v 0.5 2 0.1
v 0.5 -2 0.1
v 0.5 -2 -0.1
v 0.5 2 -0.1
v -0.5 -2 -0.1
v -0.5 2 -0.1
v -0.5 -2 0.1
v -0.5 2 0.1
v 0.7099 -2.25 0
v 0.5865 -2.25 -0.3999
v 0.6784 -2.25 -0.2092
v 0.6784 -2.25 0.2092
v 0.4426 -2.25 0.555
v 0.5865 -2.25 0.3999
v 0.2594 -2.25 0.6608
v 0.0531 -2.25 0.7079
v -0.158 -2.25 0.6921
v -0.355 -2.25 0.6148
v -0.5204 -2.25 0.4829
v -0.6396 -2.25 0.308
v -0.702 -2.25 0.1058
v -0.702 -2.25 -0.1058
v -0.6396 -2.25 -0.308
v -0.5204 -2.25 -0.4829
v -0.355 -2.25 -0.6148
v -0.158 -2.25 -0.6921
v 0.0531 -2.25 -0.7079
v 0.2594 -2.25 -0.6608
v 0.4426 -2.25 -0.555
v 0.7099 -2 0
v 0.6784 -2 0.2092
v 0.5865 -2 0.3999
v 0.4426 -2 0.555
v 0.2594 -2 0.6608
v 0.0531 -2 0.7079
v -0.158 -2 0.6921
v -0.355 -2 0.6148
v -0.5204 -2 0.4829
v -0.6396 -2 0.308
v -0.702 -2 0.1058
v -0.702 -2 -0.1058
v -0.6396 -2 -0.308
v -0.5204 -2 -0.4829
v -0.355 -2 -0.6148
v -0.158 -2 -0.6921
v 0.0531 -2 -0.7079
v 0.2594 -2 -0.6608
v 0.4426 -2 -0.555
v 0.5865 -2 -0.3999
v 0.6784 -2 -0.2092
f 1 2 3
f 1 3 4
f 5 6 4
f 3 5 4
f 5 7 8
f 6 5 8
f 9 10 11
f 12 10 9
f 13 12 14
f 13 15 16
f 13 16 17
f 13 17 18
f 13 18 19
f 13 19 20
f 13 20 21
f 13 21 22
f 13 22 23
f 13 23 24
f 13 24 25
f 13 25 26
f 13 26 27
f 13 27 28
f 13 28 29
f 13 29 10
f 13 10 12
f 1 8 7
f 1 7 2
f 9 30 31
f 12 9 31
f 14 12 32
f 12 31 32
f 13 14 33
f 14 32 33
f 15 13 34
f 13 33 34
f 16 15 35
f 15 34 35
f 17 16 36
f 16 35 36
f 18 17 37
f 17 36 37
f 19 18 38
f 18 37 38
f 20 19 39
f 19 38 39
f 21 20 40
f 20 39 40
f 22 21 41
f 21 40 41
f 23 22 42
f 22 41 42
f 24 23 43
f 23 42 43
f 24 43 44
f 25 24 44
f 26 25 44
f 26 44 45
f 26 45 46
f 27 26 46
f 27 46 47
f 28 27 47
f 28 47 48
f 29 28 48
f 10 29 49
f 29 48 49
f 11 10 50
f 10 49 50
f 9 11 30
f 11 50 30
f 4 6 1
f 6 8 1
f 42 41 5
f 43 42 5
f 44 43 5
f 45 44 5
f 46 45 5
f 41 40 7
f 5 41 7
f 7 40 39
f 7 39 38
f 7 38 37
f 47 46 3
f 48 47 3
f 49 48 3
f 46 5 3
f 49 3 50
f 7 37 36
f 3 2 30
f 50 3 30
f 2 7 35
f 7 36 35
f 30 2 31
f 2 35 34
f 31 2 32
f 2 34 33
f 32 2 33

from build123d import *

# Parameters (mm, degrees)
SKETCH1_W           = 1
SKETCH1_H           = 4
BOSS_EXTRUDE1_DEPTH = 0.1
SKETCH3_R           = 0.709901951
BOSS_EXTRUDE3_DEPTH = 0.25


with BuildPart() as part:
    # Sketch1 → Boss-Extrude1 (new body, symmetric)
    with BuildSketch(Plane.XY):
        Rectangle(SKETCH1_W, SKETCH1_H)
    extrude(amount=BOSS_EXTRUDE1_DEPTH, both=True)

    # Sketch3 → Boss-Extrude3 (add)
    with BuildSketch(Plane.XZ.offset(2)):
        Circle(SKETCH3_R)
    extrude(amount=BOSS_EXTRUDE3_DEPTH)


solid = part.part
